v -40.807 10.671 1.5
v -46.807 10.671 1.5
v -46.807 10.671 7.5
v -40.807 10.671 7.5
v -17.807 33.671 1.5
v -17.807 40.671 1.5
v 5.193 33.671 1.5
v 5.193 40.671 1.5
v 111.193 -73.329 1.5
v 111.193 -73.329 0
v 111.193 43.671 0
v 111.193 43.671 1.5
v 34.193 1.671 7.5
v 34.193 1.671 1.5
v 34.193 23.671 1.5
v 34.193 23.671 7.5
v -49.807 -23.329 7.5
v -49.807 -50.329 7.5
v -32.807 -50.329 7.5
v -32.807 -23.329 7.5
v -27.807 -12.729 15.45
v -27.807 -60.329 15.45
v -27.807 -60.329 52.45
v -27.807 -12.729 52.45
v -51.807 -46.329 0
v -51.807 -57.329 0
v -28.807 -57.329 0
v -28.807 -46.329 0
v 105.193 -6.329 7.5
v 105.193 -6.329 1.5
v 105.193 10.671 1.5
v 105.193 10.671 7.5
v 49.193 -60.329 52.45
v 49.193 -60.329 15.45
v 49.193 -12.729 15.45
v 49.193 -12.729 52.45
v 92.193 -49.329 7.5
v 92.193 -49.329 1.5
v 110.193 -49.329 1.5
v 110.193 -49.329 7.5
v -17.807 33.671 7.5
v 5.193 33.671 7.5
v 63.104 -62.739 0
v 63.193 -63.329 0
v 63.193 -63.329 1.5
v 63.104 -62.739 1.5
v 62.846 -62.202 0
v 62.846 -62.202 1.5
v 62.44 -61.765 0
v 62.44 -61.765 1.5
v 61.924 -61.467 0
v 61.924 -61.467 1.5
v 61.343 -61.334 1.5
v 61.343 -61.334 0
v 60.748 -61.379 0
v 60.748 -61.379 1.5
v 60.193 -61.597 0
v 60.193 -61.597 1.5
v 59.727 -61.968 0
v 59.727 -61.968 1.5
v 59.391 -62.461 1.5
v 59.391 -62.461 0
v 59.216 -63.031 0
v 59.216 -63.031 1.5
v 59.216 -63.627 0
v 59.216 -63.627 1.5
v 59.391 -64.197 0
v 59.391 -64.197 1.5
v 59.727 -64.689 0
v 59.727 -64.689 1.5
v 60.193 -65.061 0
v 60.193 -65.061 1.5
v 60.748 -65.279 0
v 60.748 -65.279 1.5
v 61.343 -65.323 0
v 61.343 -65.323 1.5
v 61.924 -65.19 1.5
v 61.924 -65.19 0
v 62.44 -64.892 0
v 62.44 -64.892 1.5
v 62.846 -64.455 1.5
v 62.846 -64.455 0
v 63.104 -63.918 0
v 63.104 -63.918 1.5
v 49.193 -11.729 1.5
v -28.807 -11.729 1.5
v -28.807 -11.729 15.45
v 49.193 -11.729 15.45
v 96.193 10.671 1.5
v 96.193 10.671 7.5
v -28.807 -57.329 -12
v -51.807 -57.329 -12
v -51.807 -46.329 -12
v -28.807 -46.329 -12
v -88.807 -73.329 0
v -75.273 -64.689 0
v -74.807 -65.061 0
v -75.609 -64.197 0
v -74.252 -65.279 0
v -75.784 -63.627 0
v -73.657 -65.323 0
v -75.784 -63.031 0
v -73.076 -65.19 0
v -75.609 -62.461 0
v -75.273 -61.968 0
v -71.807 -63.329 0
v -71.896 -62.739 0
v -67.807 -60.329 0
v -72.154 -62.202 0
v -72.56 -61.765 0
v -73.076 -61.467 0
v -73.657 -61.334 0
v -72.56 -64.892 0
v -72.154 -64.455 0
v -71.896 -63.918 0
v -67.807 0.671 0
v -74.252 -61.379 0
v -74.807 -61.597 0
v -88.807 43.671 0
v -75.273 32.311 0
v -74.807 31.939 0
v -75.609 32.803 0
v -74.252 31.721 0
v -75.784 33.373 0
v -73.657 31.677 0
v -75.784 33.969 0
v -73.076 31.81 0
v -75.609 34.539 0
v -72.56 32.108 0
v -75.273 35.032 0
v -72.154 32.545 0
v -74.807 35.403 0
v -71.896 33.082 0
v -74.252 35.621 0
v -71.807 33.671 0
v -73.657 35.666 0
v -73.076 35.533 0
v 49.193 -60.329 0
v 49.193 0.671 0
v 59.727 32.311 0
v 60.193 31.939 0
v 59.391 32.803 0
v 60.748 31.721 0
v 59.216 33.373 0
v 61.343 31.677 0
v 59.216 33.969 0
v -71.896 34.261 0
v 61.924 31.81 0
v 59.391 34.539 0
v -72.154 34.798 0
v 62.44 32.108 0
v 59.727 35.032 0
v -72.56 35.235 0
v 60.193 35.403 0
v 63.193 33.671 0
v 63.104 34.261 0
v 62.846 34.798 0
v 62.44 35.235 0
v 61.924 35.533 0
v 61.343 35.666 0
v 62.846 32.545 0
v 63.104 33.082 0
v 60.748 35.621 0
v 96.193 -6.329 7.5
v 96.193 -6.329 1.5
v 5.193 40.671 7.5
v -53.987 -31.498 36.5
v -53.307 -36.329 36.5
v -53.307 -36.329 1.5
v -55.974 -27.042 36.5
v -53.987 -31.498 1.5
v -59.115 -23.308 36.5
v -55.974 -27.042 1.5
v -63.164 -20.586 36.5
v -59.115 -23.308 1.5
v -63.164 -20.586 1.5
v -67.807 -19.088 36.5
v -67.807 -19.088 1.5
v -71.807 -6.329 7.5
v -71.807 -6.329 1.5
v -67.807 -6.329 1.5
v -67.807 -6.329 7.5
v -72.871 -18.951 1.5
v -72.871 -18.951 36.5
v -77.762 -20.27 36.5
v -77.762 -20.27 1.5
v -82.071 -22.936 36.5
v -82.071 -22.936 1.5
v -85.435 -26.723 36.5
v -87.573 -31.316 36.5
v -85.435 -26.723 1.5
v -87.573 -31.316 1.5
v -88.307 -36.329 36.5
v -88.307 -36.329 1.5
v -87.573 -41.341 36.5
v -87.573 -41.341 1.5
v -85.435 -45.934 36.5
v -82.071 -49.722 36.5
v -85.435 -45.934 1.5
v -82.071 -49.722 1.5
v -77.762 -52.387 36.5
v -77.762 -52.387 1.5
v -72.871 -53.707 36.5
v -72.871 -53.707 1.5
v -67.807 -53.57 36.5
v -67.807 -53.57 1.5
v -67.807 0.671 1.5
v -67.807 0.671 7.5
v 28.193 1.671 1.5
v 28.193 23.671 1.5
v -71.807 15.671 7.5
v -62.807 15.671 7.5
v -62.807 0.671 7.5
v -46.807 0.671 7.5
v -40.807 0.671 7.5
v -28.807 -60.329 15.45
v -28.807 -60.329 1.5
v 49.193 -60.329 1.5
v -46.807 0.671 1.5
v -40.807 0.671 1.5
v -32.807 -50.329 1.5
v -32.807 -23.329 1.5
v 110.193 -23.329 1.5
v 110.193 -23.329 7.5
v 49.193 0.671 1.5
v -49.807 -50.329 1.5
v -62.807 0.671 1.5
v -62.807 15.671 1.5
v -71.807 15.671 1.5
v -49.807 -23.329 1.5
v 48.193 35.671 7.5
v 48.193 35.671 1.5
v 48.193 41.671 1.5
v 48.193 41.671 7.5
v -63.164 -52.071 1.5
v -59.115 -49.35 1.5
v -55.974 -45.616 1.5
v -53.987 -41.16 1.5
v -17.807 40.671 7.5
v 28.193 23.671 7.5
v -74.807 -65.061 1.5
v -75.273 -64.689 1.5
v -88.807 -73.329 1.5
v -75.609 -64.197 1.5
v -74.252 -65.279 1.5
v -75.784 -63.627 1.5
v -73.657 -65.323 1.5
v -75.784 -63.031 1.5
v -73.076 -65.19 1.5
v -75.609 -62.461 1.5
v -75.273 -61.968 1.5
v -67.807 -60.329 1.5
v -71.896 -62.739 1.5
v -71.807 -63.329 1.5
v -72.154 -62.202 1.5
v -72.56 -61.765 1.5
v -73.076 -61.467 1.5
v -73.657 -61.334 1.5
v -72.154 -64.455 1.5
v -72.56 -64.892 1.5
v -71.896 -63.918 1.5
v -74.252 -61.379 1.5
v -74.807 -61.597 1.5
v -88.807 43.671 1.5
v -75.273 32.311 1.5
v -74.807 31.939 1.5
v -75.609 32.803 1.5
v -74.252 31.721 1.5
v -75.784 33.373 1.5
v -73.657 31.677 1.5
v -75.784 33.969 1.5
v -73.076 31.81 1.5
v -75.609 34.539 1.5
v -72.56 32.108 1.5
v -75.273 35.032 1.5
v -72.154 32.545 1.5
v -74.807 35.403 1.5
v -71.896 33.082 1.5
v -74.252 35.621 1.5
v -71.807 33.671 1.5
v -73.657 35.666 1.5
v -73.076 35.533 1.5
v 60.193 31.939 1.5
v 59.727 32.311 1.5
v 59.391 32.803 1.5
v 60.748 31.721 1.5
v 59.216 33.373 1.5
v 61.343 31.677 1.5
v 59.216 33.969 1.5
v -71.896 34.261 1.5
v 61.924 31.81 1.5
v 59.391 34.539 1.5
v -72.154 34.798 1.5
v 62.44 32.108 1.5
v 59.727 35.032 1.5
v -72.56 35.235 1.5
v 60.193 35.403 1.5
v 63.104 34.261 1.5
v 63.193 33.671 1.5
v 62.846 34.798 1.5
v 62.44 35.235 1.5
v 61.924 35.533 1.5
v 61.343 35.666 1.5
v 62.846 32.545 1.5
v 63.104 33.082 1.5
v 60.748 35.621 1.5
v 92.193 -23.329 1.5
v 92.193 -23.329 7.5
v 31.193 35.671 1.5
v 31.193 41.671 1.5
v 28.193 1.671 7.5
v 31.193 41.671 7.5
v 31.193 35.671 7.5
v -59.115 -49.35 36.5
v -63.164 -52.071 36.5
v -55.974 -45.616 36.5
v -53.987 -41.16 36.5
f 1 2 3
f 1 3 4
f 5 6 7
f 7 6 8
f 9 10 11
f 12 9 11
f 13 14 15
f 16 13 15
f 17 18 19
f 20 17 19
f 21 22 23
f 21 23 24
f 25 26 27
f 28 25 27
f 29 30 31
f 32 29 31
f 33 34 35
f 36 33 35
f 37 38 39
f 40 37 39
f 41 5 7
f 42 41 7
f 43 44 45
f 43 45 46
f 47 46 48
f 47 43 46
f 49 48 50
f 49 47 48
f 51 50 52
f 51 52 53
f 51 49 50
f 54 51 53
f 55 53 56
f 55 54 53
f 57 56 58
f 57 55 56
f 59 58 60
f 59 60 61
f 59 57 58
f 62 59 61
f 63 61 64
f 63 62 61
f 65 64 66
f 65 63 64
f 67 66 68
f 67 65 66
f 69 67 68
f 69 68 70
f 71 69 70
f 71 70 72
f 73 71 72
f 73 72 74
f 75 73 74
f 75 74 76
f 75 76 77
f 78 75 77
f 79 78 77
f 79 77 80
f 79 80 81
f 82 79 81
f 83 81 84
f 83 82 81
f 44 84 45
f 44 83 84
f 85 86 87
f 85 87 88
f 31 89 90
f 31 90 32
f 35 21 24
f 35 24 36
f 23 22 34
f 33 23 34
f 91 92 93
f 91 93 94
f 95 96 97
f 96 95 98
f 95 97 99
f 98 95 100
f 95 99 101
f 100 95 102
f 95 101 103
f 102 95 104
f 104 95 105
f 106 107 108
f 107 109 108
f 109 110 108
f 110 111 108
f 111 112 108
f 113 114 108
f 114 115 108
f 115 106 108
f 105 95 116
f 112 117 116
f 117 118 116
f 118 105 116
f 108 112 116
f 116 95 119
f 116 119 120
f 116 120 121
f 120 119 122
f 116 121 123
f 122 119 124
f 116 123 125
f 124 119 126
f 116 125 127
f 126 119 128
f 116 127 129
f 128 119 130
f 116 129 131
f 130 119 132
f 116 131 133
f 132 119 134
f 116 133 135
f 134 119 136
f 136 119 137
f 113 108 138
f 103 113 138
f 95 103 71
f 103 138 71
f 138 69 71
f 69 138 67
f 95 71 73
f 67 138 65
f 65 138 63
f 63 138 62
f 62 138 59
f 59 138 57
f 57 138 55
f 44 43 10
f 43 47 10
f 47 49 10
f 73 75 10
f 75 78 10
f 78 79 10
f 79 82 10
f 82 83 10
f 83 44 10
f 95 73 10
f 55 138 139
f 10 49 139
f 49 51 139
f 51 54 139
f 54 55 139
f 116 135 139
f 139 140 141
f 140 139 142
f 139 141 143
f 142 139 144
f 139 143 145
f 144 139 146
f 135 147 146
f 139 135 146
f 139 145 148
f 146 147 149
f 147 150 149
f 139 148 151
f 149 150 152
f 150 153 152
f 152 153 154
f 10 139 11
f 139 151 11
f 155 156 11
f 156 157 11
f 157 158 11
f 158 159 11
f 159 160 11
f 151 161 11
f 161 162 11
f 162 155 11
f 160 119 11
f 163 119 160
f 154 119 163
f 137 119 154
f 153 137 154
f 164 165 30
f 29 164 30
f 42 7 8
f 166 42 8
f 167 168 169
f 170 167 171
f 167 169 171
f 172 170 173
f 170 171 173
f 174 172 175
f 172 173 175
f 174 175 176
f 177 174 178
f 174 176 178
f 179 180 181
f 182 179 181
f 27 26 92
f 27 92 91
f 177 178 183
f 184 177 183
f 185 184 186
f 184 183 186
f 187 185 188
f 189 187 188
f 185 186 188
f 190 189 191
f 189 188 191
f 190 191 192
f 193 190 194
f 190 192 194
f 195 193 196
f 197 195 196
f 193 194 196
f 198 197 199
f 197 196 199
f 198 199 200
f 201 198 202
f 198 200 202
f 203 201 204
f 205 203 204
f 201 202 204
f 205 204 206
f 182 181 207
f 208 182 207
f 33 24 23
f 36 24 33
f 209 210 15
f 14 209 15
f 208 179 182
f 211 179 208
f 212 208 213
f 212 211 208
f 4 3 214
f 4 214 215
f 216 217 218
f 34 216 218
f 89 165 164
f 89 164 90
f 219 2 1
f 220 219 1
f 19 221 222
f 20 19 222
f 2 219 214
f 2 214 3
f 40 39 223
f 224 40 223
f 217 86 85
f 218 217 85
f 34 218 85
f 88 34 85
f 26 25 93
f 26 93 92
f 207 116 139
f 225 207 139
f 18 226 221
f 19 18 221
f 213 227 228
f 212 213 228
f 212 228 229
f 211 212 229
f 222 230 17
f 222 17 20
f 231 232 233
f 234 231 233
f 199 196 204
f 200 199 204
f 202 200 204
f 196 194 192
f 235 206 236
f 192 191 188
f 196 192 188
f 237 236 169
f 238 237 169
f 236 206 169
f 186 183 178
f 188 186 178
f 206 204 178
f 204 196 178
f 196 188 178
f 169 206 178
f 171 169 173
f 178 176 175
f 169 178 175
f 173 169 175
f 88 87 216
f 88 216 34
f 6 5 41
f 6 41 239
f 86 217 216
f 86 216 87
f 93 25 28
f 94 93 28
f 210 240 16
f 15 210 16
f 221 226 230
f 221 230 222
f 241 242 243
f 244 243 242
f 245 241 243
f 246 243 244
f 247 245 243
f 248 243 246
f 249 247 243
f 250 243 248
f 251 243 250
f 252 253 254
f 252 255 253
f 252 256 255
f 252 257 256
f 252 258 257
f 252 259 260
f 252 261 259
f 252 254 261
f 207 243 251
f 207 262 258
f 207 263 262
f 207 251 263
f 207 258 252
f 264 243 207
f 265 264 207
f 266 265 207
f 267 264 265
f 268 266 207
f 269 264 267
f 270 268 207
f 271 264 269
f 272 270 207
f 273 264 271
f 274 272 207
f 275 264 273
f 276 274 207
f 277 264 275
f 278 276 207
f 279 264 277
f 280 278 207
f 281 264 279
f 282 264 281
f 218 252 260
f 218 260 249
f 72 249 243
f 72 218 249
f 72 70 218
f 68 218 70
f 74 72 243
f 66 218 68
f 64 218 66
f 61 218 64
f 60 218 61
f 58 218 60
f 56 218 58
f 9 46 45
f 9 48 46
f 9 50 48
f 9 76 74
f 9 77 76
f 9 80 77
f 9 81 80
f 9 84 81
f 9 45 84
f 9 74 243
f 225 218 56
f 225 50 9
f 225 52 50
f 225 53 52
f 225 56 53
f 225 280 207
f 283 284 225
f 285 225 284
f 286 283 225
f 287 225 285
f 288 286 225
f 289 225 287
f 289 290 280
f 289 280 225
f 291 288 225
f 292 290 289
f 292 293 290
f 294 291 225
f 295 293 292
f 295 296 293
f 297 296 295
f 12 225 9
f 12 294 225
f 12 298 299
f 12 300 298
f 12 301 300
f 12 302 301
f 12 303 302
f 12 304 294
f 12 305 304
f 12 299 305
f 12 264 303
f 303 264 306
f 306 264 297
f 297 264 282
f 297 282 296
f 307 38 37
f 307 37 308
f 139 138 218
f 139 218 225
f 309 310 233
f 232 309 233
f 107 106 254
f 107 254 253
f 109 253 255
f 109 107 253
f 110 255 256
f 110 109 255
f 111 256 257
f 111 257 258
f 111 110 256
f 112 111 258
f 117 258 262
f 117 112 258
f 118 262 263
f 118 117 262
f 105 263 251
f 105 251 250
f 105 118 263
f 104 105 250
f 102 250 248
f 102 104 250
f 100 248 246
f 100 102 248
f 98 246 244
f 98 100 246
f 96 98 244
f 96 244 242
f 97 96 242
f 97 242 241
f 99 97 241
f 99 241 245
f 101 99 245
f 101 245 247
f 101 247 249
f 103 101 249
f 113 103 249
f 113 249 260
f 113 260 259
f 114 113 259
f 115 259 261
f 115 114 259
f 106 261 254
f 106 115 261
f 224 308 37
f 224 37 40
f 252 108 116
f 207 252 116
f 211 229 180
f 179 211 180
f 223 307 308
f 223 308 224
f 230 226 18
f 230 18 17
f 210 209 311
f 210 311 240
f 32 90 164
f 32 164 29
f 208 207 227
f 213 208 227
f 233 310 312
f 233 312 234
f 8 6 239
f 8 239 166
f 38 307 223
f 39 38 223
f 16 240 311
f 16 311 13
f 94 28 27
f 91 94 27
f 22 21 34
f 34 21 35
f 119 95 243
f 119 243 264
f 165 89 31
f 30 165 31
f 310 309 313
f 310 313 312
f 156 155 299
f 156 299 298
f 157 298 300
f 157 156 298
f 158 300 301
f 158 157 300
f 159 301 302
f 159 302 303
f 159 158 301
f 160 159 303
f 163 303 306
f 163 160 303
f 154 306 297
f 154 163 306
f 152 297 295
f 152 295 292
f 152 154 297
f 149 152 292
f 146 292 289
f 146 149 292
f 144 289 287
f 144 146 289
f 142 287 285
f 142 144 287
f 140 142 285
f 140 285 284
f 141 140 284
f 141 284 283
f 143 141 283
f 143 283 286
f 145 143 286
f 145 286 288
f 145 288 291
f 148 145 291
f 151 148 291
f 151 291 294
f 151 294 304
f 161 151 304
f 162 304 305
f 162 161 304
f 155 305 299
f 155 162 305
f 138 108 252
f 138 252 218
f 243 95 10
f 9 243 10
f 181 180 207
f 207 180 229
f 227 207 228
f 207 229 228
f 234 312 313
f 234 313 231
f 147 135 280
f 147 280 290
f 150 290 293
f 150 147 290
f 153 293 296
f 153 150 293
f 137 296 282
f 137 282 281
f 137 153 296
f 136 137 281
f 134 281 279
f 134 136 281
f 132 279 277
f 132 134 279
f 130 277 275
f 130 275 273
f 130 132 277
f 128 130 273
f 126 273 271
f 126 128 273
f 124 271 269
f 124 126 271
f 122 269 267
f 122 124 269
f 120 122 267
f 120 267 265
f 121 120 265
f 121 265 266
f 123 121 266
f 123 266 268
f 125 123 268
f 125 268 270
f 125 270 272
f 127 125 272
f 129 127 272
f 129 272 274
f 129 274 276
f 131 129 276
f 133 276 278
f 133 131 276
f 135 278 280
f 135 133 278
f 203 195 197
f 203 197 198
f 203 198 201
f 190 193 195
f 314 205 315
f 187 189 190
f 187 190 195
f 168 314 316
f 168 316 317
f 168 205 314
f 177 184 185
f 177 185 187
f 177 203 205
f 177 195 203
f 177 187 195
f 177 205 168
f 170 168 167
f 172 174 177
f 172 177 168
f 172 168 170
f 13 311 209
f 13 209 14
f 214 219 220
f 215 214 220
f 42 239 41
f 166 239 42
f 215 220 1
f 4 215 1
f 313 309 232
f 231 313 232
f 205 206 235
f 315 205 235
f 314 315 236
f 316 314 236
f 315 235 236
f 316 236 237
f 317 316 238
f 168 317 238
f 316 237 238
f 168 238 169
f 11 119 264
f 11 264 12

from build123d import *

# Parameters (mm, degrees)
F0_W      = 200
F0_H      = 117
F0_R      = 2
F0_W_2    = 117
F0_H_2    = 61
F1_DEPTH  = 1.5
F2_W      = 23
F2_H      = 7
F3_DEPTH  = 6
F2_W_2    = 17
F2_H_2    = 6
F2_W_3    = 6
F2_H_3    = 22
F2_W_4    = 18
F2_H_4    = 26
F2_H_5    = 27
F2_W_5    = 9
F2_H_6    = 17
F2_H_7    = 10
F4_DEPTH  = 35
F5_W      = 78
F5_H      = 48.6
F6_DEPTH  = 13.95
F7_W      = 77
F7_H      = 47.6
F8_DEPTH  = 37
F9_W      = 23
F9_H      = 11
F10_DEPTH = 12


with BuildPart() as f1:
    # F0 (on Top) → F1 (new body)
    with BuildSketch(Plane.XY):
        with Locations((11.1932437867, -14.8287359455)):
            Rectangle(F0_W, F0_H)
        with Locations((-73.8067562133, -63.3287359455)):
            Circle(F0_R, mode=Mode.SUBTRACT)
        with Locations((-9.3067562133, -29.8287359455)):
            Rectangle(F0_W_2, F0_H_2, mode=Mode.SUBTRACT)
        with Locations((61.1932437867, -63.3287359455)):
            Circle(F0_R, mode=Mode.SUBTRACT)
        with Locations((-73.8067562133, 33.6712640545)):
            Circle(F0_R, mode=Mode.SUBTRACT)
        with Locations((61.1932437867, 33.6712640545)):
            Circle(F0_R, mode=Mode.SUBTRACT)
    extrude(amount=F1_DEPTH)


with BuildPart() as f3:
    # F2 (on face) → F3 (new body)
    with BuildSketch(Plane.XY.offset(1.5)):
        with Locations((-6.3067562133, 37.1712640545)):
            Rectangle(F2_W, F2_H)
    extrude(amount=F3_DEPTH)


with BuildPart() as f3b:
    # F2 (on face) → F3, piece 2 (new body)
    with BuildSketch(Plane.XY.offset(1.5)):
        with Locations((39.6932437867, 38.6712640545)):
            Rectangle(F2_W_2, F2_H_2)
    extrude(amount=F3_DEPTH)


with BuildPart() as f3c:
    # F2 (on face) → F3, piece 3 (new body)
    with BuildSketch(Plane.XY.offset(1.5)):
        with Locations((31.1932437867, 12.6712640545)):
            Rectangle(F2_W_3, F2_H_3)
    extrude(amount=F3_DEPTH)


with BuildPart() as f3d:
    # F2 (on face) → F3, piece 4 (new body)
    with BuildSketch(Plane.XY.offset(1.5)):
        with Locations((101.1932437867, -36.3287359455)):
            Rectangle(F2_W_4, F2_H_4)
    extrude(amount=F3_DEPTH)


with BuildPart() as f3e:
    # F2 (on face) → F3, piece 5 (new body)
    with BuildSketch(Plane.XY.offset(1.5)):
        with Locations((-41.3067562133, -36.8287359455)):
            Rectangle(F2_W_2, F2_H_5)
    extrude(amount=F3_DEPTH)


with BuildPart() as f3f:
    # F2 (on face) → F3, piece 6 (new body)
    with BuildSketch(Plane.XY.offset(1.5)):
        Polygon((-71.8067562133, -6.3287359455), (-67.8067562133, -6.3287359455), (-67.8067562133, 0.6712640545), (-62.8067562133, 0.6712640545), (-62.8067562133, 15.6712640545), (-71.8067562133, 15.6712640545), align=None)
    extrude(amount=F3_DEPTH)


with BuildPart() as f3g:
    # F2 (on face) → F3, piece 7 (new body)
    with BuildSketch(Plane.XY.offset(1.5)):
        with Locations((100.6932437867, 2.1712640545)):
            Rectangle(F2_W_5, F2_H_6)
    extrude(amount=F3_DEPTH)


with BuildPart() as f3h:
    # F2 (on face) → F3, piece 8 (new body)
    with BuildSketch(Plane.XY.offset(1.5)):
        with Locations((-43.8067562133, 5.6712640545)):
            Rectangle(F2_W_3, F2_H_7)
    extrude(amount=F3_DEPTH)


with BuildPart() as f4:
    # F2 (on face) → F4 (new body)
    with BuildSketch(Plane.XY.offset(1.5)):
        with BuildLine():
            Line((-67.8067562133, -53.5696755951), (-67.8067562133, -19.087796296))
            ThreePointArc((-67.8067562133, -19.087796296), (-88.3067562133, -36.3287359455), (-67.8067562133, -53.5696755951))
        make_face()
        with BuildLine():
            ThreePointArc((-67.8067562133, -53.5696755951), (-57.4136609773, -47.5926162716), (-53.3067562133, -36.3287359455))
            ThreePointArc((-53.3067562133, -36.3287359455), (-57.4136609773, -25.0648556195), (-67.8067562133, -19.087796296))
            Line((-67.8067562133, -19.087796296), (-67.8067562133, -53.5696755951))
        make_face()
    extrude(amount=F4_DEPTH)


with BuildPart() as f6:
    # F5 (on face) → F6 (new body)
    with BuildSketch(Plane.XY.offset(1.5)):
        with Locations((10.1932437867, -36.0287359455)):
            Rectangle(F5_W, F5_H)
    extrude(amount=F6_DEPTH)


with BuildPart() as f8:
    # F7 (on face) → F8 (new body)
    with BuildSketch(Plane.XY.offset(15.45)):
        with Locations((10.6932437867, -36.5287359455)):
            Rectangle(F7_W, F7_H)
    extrude(amount=F8_DEPTH)


with BuildPart() as f10:
    # F9 (on face) → F10 (new body)
    with BuildSketch(Plane(origin=(0, 0, 0), x_dir=(1, 0, 0), z_dir=(0, 0, -1))):
        with Locations((-40.3067562133, 51.8287359455)):
            Rectangle(F9_W, F9_H)
    extrude(amount=F10_DEPTH)


solid = Compound([f1.part, f3.part, f3b.part, f3c.part, f3d.part, f3e.part, f3f.part, f3g.part, f3h.part, f4.part, f6.part, f8.part, f10.part])
